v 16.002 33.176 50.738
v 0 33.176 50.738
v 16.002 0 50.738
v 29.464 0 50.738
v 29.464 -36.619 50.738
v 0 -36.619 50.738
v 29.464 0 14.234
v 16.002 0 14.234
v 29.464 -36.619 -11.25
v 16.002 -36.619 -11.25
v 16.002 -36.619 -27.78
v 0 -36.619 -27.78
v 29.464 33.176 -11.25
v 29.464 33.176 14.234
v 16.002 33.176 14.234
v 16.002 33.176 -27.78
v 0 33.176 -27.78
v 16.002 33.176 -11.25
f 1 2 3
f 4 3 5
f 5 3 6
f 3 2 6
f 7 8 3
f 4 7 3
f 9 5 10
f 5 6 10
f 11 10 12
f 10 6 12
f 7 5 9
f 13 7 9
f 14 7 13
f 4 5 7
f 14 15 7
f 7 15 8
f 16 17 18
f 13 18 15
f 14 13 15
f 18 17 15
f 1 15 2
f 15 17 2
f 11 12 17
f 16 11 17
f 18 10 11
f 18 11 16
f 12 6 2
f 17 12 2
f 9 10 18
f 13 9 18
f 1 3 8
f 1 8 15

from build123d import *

# Parameters (mm, degrees)
F0_W     = 69.795026
F0_H     = 78.517704
F1_DEPTH = 16.002
F3_DEPTH = 13.462


with BuildPart() as f1:
    # F0 (on Right) → F1 (new body)
    with BuildSketch(Plane.YZ):
        with Locations((-1.721126, 11.479196)):
            Rectangle(F0_W, F0_H)
    extrude(amount=F1_DEPTH)

    # F2 (on face) → F3 (join)
    with BuildSketch(Plane.YZ.offset(16.002)):
        Polygon((0, 14.234204), (0, 50.738048), (-36.618639, 50.738048), (-36.618639, -11.249613), (33.176387, -11.249613), (33.176387, 14.234204), align=None)
    extrude(amount=F3_DEPTH)


solid = f1.part
